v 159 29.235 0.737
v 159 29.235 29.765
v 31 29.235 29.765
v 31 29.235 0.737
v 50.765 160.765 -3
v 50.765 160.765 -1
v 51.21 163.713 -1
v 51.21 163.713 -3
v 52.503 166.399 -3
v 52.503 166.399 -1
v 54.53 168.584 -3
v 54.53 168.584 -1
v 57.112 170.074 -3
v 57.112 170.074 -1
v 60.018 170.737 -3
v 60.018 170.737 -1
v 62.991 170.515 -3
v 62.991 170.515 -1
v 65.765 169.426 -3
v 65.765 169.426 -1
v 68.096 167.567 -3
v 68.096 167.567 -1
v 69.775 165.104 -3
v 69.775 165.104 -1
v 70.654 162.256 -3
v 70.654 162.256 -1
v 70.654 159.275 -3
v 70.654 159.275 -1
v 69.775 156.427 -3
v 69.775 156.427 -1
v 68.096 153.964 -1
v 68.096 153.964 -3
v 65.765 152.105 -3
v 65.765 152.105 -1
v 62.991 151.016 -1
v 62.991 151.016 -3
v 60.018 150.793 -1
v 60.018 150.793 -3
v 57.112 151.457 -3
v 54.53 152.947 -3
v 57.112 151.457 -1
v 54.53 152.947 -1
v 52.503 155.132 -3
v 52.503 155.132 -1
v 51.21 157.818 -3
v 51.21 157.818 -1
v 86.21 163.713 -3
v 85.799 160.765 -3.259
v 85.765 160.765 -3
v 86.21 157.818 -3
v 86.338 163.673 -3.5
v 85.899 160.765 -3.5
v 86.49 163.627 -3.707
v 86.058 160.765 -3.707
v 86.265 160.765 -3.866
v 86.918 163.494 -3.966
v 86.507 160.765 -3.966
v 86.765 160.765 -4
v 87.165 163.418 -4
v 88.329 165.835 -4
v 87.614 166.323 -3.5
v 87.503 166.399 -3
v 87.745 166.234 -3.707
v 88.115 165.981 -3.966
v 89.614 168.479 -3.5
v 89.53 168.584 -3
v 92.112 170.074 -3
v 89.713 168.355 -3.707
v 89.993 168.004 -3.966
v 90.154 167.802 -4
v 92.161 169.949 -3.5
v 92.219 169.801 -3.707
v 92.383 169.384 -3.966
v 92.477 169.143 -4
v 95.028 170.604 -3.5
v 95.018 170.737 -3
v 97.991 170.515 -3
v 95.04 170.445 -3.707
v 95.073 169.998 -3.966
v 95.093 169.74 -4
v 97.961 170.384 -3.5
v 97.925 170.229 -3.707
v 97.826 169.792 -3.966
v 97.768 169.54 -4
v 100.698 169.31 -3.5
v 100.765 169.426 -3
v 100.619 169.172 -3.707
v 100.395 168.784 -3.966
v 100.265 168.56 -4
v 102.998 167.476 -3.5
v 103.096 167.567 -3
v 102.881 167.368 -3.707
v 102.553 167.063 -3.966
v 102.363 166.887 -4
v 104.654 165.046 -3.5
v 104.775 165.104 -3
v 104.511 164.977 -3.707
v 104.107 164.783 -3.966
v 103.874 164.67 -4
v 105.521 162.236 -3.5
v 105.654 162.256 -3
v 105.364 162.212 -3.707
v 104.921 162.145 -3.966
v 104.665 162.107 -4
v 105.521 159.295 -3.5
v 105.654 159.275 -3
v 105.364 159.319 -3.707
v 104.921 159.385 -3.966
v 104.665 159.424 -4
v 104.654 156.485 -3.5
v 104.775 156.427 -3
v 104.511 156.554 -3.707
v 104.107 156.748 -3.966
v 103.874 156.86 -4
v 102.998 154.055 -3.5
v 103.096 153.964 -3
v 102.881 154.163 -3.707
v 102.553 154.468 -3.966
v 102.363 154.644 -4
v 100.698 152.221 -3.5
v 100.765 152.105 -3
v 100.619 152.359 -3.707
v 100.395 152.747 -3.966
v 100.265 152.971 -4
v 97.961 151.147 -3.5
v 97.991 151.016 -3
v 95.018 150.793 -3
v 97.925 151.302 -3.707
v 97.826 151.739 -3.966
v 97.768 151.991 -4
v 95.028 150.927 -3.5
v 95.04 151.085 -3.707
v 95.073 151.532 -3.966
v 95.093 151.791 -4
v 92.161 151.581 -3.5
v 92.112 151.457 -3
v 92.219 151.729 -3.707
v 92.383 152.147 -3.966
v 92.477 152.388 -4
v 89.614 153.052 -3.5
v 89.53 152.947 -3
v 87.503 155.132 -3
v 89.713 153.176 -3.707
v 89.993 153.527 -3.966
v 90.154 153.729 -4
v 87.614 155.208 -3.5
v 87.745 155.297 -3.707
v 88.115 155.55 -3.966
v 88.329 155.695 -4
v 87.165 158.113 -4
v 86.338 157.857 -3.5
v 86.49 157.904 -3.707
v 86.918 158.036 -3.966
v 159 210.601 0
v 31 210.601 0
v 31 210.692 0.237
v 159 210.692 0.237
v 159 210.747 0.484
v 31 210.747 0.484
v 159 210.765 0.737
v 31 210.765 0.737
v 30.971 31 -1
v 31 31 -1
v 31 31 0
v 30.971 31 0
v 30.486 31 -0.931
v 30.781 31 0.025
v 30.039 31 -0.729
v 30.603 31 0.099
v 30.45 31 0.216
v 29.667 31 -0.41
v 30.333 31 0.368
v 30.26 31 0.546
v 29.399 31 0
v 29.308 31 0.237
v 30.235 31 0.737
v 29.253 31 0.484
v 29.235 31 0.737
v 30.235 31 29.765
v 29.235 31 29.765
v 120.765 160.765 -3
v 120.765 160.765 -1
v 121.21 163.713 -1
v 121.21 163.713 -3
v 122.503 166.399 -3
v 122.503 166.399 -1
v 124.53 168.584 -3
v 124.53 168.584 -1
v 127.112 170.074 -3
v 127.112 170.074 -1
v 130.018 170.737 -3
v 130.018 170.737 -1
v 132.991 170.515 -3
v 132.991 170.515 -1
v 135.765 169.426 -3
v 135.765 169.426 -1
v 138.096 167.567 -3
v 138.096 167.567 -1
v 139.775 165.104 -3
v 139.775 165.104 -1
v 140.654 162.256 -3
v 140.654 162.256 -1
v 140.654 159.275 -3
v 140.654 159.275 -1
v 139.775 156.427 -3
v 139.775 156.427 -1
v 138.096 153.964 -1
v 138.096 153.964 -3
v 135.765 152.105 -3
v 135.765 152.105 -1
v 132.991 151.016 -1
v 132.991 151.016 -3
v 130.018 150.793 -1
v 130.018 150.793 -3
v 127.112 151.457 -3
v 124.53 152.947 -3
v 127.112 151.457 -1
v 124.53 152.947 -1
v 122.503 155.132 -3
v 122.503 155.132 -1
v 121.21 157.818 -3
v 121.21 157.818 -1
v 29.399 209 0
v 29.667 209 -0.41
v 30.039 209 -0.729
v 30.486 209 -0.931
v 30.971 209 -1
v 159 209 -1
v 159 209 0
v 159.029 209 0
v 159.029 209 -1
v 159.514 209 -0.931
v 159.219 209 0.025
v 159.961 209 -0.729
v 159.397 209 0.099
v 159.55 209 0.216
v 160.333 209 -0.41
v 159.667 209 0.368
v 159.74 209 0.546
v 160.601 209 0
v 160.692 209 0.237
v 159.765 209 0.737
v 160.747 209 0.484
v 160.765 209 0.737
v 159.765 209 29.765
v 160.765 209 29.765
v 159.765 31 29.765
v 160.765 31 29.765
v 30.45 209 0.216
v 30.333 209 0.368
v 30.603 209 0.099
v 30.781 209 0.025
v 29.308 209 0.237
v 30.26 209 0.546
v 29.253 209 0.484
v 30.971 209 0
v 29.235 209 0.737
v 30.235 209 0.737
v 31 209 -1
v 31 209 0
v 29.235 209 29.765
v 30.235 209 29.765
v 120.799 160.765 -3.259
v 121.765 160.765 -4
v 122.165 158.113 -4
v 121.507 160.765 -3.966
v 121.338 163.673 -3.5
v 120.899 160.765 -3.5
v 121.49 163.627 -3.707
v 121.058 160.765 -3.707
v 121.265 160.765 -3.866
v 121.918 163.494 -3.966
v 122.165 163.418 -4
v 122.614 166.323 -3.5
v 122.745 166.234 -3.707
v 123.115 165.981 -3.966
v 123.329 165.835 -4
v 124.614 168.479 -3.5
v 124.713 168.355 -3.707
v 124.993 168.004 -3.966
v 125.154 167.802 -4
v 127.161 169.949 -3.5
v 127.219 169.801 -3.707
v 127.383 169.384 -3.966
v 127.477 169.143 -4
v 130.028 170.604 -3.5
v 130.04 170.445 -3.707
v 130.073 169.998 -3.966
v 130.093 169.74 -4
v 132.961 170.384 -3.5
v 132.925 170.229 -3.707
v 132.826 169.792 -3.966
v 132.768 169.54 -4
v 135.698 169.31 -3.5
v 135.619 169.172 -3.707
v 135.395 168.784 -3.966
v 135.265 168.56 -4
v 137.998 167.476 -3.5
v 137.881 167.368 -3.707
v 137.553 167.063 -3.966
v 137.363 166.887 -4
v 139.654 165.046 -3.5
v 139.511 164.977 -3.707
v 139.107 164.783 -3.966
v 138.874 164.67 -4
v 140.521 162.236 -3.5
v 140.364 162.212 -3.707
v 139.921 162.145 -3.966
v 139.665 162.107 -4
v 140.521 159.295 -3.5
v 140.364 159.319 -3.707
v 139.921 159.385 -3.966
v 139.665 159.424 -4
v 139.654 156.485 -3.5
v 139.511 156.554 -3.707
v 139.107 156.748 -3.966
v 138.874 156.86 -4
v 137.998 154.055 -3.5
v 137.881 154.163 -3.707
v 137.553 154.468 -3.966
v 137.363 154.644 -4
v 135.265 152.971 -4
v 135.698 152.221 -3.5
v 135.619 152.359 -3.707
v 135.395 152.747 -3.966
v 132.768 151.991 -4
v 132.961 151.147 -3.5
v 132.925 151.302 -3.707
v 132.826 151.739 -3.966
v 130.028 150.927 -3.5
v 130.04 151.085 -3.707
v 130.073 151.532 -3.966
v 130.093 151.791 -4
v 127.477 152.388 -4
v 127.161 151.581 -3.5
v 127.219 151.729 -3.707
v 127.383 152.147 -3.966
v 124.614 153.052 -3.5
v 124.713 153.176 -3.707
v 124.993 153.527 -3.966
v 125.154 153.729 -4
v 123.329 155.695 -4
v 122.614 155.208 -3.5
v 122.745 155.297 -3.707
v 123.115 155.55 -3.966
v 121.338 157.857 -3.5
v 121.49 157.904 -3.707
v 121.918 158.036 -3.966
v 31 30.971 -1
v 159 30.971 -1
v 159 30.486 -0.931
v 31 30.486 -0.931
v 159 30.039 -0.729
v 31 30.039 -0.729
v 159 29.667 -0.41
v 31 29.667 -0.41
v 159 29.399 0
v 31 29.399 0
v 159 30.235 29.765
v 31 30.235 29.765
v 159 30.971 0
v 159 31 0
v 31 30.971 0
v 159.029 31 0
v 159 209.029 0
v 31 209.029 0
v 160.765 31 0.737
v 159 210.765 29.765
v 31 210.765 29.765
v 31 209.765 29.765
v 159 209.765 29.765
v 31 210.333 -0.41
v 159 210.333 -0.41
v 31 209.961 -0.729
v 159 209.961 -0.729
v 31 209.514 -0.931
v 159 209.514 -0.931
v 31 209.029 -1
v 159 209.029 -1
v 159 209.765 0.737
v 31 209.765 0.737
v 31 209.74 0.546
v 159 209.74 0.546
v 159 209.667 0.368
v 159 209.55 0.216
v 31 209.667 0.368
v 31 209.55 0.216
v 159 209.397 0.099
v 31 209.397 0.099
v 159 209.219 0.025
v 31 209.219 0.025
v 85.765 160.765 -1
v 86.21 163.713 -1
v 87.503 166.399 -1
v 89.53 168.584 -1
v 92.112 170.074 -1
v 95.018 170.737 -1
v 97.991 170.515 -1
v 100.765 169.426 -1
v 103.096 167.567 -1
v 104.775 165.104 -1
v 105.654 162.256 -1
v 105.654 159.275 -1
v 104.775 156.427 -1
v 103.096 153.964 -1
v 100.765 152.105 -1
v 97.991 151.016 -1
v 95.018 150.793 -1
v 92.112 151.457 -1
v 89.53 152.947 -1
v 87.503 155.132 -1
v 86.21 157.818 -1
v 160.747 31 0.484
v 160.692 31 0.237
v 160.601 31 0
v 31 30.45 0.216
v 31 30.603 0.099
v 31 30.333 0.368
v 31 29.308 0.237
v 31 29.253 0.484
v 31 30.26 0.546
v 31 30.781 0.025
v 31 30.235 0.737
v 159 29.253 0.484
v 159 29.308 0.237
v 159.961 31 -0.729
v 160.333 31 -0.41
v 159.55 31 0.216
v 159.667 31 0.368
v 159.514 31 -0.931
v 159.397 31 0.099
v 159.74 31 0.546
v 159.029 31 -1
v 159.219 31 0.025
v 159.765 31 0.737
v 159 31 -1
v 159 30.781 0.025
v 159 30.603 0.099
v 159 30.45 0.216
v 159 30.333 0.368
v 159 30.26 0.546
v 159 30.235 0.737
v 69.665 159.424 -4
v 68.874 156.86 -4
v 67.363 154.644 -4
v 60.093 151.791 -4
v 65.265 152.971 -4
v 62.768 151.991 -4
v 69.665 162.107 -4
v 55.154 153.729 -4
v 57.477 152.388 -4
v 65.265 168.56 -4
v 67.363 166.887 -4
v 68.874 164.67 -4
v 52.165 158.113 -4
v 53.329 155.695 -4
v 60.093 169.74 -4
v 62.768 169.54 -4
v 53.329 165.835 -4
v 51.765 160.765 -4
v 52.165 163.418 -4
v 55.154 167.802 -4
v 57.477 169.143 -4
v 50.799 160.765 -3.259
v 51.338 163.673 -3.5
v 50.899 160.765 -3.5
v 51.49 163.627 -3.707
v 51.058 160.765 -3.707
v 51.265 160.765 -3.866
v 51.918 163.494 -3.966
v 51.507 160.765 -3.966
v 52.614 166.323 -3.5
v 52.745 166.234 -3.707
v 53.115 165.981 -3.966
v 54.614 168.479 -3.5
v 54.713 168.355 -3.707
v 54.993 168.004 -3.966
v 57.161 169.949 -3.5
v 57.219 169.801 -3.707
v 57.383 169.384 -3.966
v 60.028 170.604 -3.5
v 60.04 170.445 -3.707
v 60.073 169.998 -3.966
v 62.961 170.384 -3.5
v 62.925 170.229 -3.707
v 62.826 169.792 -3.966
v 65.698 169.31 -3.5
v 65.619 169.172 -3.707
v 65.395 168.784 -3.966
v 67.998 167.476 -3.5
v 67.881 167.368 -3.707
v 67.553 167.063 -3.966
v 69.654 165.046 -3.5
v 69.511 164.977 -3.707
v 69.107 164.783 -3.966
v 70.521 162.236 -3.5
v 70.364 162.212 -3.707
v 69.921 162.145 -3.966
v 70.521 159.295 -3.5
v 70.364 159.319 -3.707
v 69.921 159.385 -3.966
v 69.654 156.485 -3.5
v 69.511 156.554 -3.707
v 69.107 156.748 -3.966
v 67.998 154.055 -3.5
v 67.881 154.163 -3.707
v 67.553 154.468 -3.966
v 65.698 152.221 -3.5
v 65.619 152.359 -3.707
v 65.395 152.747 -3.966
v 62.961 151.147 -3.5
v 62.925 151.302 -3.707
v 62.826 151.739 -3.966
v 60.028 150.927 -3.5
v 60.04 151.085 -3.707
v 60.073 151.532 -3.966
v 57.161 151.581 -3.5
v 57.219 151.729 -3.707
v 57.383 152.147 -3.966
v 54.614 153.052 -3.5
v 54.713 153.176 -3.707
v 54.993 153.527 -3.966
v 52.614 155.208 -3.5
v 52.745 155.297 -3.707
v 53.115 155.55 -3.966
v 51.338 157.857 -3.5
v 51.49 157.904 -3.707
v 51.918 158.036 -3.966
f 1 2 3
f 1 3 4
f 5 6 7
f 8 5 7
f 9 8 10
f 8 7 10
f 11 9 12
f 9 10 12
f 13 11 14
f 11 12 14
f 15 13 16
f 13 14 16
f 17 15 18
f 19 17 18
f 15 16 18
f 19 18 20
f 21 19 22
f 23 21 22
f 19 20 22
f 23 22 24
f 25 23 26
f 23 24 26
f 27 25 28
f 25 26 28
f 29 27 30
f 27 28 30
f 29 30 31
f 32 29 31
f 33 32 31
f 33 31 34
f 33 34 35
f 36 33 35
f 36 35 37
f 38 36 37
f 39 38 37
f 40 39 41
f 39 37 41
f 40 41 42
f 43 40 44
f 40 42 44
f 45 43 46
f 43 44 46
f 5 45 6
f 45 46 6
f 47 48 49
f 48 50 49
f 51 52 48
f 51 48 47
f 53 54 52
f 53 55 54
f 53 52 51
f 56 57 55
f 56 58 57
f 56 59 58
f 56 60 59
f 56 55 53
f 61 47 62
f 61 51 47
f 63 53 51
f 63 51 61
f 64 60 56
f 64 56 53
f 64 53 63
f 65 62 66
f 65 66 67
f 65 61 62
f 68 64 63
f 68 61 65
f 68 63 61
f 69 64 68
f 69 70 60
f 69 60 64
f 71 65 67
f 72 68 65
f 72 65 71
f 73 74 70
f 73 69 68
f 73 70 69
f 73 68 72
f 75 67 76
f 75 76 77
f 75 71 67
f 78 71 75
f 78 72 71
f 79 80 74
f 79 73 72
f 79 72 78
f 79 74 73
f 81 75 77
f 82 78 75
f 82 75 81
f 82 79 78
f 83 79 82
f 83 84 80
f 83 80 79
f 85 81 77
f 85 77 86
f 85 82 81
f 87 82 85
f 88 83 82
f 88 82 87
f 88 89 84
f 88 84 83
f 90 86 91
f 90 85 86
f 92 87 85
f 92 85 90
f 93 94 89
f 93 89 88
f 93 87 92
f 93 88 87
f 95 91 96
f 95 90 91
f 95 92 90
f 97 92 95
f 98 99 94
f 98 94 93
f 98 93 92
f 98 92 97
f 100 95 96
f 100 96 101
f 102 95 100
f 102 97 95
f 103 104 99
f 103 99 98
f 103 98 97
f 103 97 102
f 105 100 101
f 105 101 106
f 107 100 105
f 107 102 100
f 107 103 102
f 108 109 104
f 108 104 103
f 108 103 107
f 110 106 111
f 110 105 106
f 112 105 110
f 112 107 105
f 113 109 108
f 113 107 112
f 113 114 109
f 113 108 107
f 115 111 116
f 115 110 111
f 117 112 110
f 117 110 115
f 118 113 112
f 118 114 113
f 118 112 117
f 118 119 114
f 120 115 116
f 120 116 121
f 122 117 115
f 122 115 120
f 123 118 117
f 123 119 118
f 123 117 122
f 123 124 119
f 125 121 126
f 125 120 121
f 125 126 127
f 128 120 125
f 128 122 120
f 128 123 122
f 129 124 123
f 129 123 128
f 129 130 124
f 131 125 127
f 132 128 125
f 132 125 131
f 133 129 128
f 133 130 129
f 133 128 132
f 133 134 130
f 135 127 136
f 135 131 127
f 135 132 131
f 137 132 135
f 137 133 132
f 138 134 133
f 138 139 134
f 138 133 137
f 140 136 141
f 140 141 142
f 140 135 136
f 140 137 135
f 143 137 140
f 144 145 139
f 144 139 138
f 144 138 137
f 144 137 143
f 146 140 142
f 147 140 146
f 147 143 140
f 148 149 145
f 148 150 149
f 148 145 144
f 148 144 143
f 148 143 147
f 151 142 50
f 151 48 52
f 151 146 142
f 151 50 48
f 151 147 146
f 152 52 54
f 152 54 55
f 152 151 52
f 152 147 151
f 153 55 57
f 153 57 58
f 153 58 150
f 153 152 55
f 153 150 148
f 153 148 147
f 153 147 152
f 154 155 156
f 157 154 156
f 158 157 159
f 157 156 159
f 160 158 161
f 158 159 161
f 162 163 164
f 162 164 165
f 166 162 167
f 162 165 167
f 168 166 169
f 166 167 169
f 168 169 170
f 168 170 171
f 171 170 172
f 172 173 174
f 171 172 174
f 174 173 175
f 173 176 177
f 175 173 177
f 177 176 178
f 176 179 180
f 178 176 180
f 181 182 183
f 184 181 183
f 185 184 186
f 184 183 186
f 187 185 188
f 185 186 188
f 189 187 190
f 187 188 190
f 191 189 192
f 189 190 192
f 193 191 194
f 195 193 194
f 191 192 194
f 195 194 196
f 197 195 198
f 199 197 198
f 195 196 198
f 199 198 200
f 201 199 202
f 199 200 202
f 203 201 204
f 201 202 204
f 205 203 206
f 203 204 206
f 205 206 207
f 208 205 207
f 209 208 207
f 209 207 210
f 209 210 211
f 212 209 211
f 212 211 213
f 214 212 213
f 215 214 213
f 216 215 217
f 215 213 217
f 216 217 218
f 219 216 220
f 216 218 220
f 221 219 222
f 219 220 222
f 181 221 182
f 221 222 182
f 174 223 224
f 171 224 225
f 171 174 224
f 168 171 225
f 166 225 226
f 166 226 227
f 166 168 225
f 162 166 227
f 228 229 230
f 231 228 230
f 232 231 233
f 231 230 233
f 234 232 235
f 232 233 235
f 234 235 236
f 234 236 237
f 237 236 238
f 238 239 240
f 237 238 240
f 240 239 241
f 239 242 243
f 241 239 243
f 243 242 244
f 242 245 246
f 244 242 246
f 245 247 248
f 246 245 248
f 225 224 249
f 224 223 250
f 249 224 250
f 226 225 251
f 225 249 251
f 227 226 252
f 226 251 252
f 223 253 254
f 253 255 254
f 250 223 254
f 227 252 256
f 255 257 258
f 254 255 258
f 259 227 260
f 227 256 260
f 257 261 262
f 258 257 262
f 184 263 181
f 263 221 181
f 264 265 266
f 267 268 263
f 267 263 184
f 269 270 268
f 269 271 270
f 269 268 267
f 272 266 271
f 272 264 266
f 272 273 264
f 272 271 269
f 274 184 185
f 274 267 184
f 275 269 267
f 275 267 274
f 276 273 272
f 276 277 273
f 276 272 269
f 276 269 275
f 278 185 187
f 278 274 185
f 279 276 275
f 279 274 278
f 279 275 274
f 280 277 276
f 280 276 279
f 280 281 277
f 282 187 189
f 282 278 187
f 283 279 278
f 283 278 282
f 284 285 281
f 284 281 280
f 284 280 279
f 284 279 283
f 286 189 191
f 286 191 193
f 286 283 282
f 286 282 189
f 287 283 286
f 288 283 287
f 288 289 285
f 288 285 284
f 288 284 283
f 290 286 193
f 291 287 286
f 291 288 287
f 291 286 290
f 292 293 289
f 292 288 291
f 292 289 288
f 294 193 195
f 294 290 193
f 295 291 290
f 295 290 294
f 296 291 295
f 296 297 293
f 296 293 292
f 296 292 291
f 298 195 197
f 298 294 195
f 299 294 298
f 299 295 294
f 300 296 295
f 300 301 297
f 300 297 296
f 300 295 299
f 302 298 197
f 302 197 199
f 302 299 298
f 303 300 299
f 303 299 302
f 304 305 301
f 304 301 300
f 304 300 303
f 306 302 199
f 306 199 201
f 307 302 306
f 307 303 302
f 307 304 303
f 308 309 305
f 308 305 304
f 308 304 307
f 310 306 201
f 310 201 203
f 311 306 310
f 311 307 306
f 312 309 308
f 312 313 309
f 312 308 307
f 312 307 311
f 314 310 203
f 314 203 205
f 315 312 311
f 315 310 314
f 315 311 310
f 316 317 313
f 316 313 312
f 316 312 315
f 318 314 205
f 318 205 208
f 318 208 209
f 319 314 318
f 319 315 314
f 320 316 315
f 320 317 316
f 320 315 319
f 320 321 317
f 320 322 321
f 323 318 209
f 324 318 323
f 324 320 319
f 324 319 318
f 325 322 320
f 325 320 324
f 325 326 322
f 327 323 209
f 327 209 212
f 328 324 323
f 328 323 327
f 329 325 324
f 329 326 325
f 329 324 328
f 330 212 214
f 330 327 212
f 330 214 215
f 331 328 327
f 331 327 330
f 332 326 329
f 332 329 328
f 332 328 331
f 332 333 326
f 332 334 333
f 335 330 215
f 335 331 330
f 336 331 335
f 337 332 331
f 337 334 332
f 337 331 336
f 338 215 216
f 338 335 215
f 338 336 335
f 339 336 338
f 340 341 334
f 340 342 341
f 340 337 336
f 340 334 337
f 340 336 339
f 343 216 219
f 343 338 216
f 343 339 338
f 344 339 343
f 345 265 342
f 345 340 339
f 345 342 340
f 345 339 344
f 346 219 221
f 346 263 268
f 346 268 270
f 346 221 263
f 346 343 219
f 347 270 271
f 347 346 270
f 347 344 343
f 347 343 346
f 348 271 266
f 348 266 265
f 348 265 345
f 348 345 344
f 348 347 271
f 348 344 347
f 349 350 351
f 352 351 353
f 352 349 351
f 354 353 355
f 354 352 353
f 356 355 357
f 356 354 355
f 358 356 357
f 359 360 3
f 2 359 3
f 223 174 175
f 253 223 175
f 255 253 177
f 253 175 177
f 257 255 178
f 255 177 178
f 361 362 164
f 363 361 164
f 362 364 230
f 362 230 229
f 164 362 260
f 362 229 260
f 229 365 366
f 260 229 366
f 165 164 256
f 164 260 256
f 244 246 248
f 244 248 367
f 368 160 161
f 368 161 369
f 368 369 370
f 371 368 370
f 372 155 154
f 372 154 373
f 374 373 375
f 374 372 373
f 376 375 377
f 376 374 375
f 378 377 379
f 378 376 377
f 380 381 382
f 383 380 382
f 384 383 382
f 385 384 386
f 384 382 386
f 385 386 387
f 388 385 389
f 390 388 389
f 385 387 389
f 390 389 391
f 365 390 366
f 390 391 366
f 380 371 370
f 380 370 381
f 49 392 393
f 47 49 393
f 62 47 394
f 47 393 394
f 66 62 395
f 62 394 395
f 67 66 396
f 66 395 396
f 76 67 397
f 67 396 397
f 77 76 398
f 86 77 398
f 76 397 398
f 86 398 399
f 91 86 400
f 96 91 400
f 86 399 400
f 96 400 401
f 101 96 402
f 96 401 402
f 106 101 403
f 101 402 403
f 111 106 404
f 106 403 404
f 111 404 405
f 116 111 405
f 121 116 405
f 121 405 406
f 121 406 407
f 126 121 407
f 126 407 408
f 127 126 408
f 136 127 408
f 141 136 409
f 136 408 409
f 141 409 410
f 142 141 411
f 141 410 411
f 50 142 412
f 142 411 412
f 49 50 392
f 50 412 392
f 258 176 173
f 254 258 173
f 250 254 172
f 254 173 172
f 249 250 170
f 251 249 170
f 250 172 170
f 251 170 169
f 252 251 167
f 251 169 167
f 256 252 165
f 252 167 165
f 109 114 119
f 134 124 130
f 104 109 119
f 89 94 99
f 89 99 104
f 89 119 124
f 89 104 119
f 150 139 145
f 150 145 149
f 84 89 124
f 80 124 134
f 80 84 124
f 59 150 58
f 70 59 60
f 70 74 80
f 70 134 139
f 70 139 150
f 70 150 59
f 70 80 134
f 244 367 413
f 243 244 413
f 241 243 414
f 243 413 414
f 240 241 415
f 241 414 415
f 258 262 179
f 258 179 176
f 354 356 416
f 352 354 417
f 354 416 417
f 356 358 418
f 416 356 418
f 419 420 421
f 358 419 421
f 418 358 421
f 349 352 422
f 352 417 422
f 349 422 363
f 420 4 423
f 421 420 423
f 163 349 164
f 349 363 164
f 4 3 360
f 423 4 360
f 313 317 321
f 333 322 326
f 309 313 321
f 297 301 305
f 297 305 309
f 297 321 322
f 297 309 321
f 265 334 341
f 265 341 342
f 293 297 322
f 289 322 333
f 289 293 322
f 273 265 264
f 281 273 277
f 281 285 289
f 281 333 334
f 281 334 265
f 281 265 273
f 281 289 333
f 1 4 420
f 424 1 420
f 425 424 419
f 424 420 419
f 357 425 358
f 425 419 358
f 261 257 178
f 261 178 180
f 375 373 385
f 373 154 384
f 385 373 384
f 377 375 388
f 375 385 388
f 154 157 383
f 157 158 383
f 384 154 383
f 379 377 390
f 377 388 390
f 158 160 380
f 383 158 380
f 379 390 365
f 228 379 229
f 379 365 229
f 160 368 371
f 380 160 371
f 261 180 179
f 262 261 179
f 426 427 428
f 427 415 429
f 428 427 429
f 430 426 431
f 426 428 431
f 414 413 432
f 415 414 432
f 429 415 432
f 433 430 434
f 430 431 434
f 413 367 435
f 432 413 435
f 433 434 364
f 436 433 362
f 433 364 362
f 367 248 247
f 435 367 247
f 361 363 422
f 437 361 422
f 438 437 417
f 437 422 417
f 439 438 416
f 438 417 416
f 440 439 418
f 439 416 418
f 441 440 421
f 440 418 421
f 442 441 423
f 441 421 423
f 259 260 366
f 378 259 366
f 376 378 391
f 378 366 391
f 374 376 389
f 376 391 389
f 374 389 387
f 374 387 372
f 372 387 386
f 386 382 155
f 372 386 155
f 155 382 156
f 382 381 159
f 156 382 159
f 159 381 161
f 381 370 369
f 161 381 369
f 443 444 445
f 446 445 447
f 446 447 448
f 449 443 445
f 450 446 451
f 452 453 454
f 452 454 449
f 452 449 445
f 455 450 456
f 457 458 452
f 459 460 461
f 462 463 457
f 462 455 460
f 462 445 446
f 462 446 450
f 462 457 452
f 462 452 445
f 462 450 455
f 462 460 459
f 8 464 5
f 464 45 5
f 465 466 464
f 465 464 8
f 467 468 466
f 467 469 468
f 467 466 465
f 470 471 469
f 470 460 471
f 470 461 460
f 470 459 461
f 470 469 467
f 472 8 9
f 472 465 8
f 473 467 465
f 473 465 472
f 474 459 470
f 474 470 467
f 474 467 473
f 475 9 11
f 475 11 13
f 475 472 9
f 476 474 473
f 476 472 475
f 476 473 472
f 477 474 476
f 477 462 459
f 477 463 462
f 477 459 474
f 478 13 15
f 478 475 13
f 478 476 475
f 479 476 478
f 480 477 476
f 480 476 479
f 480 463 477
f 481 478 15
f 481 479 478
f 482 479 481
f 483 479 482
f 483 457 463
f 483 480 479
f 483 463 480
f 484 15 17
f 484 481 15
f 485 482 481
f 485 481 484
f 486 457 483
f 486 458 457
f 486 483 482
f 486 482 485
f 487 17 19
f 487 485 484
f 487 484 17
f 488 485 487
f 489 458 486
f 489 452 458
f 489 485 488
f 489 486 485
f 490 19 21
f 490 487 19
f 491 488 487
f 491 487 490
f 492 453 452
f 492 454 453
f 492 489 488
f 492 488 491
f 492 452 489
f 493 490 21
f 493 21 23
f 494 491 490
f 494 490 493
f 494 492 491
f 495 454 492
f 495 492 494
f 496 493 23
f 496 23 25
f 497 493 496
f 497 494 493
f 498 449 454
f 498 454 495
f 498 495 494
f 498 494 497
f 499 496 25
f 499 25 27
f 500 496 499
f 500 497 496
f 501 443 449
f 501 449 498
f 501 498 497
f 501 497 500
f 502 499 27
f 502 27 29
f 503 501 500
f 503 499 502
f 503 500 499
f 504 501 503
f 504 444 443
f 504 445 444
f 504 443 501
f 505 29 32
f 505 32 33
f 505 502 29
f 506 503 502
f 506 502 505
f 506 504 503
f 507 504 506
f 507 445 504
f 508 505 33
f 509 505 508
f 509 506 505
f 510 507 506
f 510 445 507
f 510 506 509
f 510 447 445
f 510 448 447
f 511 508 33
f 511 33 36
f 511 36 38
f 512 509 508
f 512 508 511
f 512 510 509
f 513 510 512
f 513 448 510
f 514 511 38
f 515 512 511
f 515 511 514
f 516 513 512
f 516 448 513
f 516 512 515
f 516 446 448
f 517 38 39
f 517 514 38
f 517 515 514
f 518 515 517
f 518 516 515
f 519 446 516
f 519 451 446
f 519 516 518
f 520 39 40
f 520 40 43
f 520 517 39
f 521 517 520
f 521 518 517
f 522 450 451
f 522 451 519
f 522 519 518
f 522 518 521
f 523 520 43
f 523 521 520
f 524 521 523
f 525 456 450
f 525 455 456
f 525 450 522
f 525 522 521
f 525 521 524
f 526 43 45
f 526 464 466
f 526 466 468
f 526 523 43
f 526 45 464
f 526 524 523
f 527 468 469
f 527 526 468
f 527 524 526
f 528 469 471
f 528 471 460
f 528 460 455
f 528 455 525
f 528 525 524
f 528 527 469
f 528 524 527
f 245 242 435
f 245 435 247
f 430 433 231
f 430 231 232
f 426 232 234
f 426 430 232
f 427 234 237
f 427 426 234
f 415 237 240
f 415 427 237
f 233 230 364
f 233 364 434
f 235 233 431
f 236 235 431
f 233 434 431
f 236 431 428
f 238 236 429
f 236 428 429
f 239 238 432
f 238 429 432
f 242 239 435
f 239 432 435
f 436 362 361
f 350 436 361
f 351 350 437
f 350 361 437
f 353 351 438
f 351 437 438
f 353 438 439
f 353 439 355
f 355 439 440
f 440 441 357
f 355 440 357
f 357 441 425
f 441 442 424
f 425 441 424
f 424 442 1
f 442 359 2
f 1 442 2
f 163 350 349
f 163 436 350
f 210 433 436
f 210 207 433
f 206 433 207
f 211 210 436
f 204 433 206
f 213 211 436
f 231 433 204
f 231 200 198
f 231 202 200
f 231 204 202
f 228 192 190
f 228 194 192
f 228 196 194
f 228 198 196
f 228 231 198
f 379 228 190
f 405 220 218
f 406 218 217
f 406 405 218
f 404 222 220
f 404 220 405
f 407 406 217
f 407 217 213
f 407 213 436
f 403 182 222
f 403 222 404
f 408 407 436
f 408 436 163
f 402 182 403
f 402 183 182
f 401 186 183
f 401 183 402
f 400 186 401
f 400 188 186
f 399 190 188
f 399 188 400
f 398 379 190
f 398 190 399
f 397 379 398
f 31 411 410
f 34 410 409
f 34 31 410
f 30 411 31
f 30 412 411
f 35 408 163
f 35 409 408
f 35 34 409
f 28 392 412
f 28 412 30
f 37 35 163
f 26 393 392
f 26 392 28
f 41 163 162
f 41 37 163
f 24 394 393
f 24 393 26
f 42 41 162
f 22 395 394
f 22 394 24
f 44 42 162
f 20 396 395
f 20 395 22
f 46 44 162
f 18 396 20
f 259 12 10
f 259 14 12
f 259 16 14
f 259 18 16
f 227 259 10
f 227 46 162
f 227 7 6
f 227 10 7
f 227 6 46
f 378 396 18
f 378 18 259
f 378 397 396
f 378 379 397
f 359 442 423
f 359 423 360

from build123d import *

# Parameters (mm, degrees)
BASE_FLANGE1_DEPTH         = 1
SKETCHED_START             = 31
SKETCHED_BEND1_DEPTH       = 178
SKETCHED_BEND1_2_DEPTH     = 128
SKETCHED_BEND1_3_DEPTH     = 178
SKETCHED_BEND1_4_OUTLINE_W = 128
SKETCHED_BEND1_4_OUTLINE_H = 1
SKETCHED_BEND1_4_DEPTH     = 29.234623369
SKETCHED_START_2           = 210.765376631
SKETCHED_BEND1_5_OUTLINE_W = 128
SKETCHED_BEND1_5_OUTLINE_H = 1
SKETCHED_BEND1_5_DEPTH     = 29.234623369
SKETCHED_BEND1_6_DEPTH     = 128
SKETCHED_BEND1_7_OUTLINE_W = 178
SKETCHED_BEND1_7_OUTLINE_H = 1
SKETCHED_BEND1_7_DEPTH     = 29.234623369
SKETCHED_START_3           = 160.765376631
SKETCHED_BEND1_8_OUTLINE_W = 178
SKETCHED_BEND1_8_OUTLINE_H = 1
SKETCHED_BEND1_8_DEPTH     = 29.234623369
SKETCH7_R                  = 10
BOSS_EXTRUDE1_DEPTH        = 3
FILLET1_R                  = 1


# Read off the part's stored shape, not the designer's step: Sketched Bend1
# Sheet-metal steps are written as plain solids
with BuildPart() as part:
    # Sketch1 → Base-Flange1 (new body)
    with BuildSketch(Plane.XY):
        Polygon((0, 209), (31, 209), (31, 240), (159, 240), (159, 209), (190, 209), (190, 31), (159, 31), (159, 0), (31, 0), (31, 31), (0, 31), align=None)
    extrude(amount=-BASE_FLANGE1_DEPTH)

    # Sketched Bend1 outline → Sketched Bend1 (add)
    with BuildSketch(Plane(origin=(0, 0, 0), x_dir=(1, 0, 0), z_dir=(0, 1, 0)).offset(SKETCHED_START)):
        with BuildLine():
            Line((29.234623369, -0.7366), (29.234623369, -29.765376631))
            Line((29.234623369, -29.765376631), (30.234623369, -29.765376631))
            Line((30.234623369, -29.765376631), (30.234623369, -0.7366))
            ThreePointArc((30.234623369, -0.7366), (30.450368514, -0.215745145), (30.971223369, 0))
            Line((30.971223369, 0), (29.398582279, 0))
            ThreePointArc((29.398582279, 0), (29.276108612, -0.359286442), (29.234623369, -0.7366))
        make_face()
        with BuildLine():
            Line((160.601417721, 0), (159.028776631, 0))
            ThreePointArc((159.028776631, 0), (159.549631486, -0.215745145), (159.765376631, -0.7366))
            Line((159.765376631, -0.7366), (159.765376631, -29.765376631))
            Line((159.765376631, -29.765376631), (160.765376631, -29.765376631))
            Line((160.765376631, -29.765376631), (160.765376631, -0.7366))
            ThreePointArc((160.765376631, -0.7366), (160.723891388, -0.359286442), (160.601417721, 0))
        make_face()
    extrude(amount=SKETCHED_BEND1_DEPTH)

    # Sketched Bend1 2 outline → Sketched Bend1 2 (add)
    with BuildSketch(Plane.YZ.offset(SKETCHED_START)):
        with BuildLine():
            Line((209.028776631, 0), (210.601417721, 0))
            ThreePointArc((210.601417721, 0), (210.723891388, 0.359286442), (210.765376631, 0.7366))
            Line((210.765376631, 0.7366), (210.765376631, 29.765376631))
            Line((210.765376631, 29.765376631), (209.765376631, 29.765376631))
            Line((209.765376631, 29.765376631), (209.765376631, 0.7366))
            ThreePointArc((209.765376631, 0.7366), (209.549631486, 0.215745145), (209.028776631, 0))
        make_face()
        with BuildLine():
            ThreePointArc((29.234623369, 0.7366), (29.276108612, 0.359286442), (29.398582279, 0))
            Line((29.398582279, 0), (30.971223369, 0))
            ThreePointArc((30.971223369, 0), (30.450368514, 0.215745145), (30.234623369, 0.7366))
            Line((30.234623369, 0.7366), (30.234623369, 29.765376631))
            Line((30.234623369, 29.765376631), (29.234623369, 29.765376631))
            Line((29.234623369, 29.765376631), (29.234623369, 0.7366))
        make_face()
    extrude(amount=SKETCHED_BEND1_2_DEPTH)

    # Sketched Bend1 3 outline → Sketched Bend1 3 (cut)
    with BuildSketch(Plane(origin=(0, 0, 0), x_dir=(1, 0, 0), z_dir=(0, 1, 0)).offset(SKETCHED_START)):
        with BuildLine():
            Line((0, 0), (29.398582279, 0))
            ThreePointArc((29.398582279, 0), (30.039397205, 0.728828115), (30.971223369, 1))
            Line((30.971223369, 1), (0, 1))
            Line((0, 1), (0, 0))
        make_face()
        with BuildLine():
            Line((190, 1), (159.028776631, 1))
            ThreePointArc((159.028776631, 1), (159.960602795, 0.728828115), (160.601417721, 0))
            Line((160.601417721, 0), (190, 0))
            Line((190, 0), (190, 1))
        make_face()
    extrude(amount=SKETCHED_BEND1_3_DEPTH, mode=Mode.SUBTRACT)

    # Sketched Bend1 4 outline → Sketched Bend1 4 (cut)
    with BuildSketch(Plane(origin=(0, 0, 0), x_dir=(1, 0, 0), z_dir=(0, 1, 0))):
        with Locations((95, 0.5)):
            Rectangle(SKETCHED_BEND1_4_OUTLINE_W, SKETCHED_BEND1_4_OUTLINE_H)
    extrude(amount=SKETCHED_BEND1_4_DEPTH, mode=Mode.SUBTRACT)

    # Sketched Bend1 5 outline → Sketched Bend1 5 (cut)
    with BuildSketch(Plane(origin=(0, 0, 0), x_dir=(1, 0, 0), z_dir=(0, 1, 0)).offset(SKETCHED_START_2)):
        with Locations((95, 0.5)):
            Rectangle(SKETCHED_BEND1_5_OUTLINE_W, SKETCHED_BEND1_5_OUTLINE_H)
    extrude(amount=SKETCHED_BEND1_5_DEPTH, mode=Mode.SUBTRACT)

    # Sketched Bend1 6 outline → Sketched Bend1 6 (cut)
    with BuildSketch(Plane.YZ.offset(SKETCHED_START)):
        with BuildLine():
            ThreePointArc((210.601417721, 0), (209.960602795, -0.728828115), (209.028776631, -1))
            Line((209.028776631, -1), (240, -1))
            Line((240, -1), (240, 0))
            Line((240, 0), (210.601417721, 0))
        make_face()
        with BuildLine():
            Line((0, -1), (30.971223369, -1))
            ThreePointArc((30.971223369, -1), (30.039397205, -0.728828115), (29.398582279, 0))
            Line((29.398582279, 0), (0, 0))
            Line((0, 0), (0, -1))
        make_face()
    extrude(amount=SKETCHED_BEND1_6_DEPTH, mode=Mode.SUBTRACT)

    # Sketched Bend1 7 outline → Sketched Bend1 7 (cut)
    with BuildSketch(Plane.YZ):
        with Locations((120, -0.5)):
            Rectangle(SKETCHED_BEND1_7_OUTLINE_W, SKETCHED_BEND1_7_OUTLINE_H)
    extrude(amount=SKETCHED_BEND1_7_DEPTH, mode=Mode.SUBTRACT)

    # Sketched Bend1 8 outline → Sketched Bend1 8 (cut)
    with BuildSketch(Plane.YZ.offset(SKETCHED_START_3)):
        with Locations((120, -0.5)):
            Rectangle(SKETCHED_BEND1_8_OUTLINE_W, SKETCHED_BEND1_8_OUTLINE_H)
    extrude(amount=SKETCHED_BEND1_8_DEPTH, mode=Mode.SUBTRACT)

    # Sketch7 → Boss-Extrude1 (add)
    with BuildSketch(Plane(origin=(0, 0, -1), x_dir=(-1, 0, 0), z_dir=(0, 0, -1))):
        with Locations((-130.765376631, 160.765376631)):
            Circle(SKETCH7_R)
        with Locations((-95.765376631, 160.765376631)):
            Circle(SKETCH7_R)
        with Locations((-60.765376631, 160.765376631)):
            Circle(SKETCH7_R)
    extrude(amount=BOSS_EXTRUDE1_DEPTH)

    # Fillet1
    fillet1_edges = [part.edges().sort_by_distance(p)[0] for p in [
        (140.765376631, 160.765376631, -4),
        (105.765376631, 160.765376631, -4),
        (70.765376631, 160.765376631, -4),
    ]]
    fillet(fillet1_edges, radius=FILLET1_R)


solid = part.part
